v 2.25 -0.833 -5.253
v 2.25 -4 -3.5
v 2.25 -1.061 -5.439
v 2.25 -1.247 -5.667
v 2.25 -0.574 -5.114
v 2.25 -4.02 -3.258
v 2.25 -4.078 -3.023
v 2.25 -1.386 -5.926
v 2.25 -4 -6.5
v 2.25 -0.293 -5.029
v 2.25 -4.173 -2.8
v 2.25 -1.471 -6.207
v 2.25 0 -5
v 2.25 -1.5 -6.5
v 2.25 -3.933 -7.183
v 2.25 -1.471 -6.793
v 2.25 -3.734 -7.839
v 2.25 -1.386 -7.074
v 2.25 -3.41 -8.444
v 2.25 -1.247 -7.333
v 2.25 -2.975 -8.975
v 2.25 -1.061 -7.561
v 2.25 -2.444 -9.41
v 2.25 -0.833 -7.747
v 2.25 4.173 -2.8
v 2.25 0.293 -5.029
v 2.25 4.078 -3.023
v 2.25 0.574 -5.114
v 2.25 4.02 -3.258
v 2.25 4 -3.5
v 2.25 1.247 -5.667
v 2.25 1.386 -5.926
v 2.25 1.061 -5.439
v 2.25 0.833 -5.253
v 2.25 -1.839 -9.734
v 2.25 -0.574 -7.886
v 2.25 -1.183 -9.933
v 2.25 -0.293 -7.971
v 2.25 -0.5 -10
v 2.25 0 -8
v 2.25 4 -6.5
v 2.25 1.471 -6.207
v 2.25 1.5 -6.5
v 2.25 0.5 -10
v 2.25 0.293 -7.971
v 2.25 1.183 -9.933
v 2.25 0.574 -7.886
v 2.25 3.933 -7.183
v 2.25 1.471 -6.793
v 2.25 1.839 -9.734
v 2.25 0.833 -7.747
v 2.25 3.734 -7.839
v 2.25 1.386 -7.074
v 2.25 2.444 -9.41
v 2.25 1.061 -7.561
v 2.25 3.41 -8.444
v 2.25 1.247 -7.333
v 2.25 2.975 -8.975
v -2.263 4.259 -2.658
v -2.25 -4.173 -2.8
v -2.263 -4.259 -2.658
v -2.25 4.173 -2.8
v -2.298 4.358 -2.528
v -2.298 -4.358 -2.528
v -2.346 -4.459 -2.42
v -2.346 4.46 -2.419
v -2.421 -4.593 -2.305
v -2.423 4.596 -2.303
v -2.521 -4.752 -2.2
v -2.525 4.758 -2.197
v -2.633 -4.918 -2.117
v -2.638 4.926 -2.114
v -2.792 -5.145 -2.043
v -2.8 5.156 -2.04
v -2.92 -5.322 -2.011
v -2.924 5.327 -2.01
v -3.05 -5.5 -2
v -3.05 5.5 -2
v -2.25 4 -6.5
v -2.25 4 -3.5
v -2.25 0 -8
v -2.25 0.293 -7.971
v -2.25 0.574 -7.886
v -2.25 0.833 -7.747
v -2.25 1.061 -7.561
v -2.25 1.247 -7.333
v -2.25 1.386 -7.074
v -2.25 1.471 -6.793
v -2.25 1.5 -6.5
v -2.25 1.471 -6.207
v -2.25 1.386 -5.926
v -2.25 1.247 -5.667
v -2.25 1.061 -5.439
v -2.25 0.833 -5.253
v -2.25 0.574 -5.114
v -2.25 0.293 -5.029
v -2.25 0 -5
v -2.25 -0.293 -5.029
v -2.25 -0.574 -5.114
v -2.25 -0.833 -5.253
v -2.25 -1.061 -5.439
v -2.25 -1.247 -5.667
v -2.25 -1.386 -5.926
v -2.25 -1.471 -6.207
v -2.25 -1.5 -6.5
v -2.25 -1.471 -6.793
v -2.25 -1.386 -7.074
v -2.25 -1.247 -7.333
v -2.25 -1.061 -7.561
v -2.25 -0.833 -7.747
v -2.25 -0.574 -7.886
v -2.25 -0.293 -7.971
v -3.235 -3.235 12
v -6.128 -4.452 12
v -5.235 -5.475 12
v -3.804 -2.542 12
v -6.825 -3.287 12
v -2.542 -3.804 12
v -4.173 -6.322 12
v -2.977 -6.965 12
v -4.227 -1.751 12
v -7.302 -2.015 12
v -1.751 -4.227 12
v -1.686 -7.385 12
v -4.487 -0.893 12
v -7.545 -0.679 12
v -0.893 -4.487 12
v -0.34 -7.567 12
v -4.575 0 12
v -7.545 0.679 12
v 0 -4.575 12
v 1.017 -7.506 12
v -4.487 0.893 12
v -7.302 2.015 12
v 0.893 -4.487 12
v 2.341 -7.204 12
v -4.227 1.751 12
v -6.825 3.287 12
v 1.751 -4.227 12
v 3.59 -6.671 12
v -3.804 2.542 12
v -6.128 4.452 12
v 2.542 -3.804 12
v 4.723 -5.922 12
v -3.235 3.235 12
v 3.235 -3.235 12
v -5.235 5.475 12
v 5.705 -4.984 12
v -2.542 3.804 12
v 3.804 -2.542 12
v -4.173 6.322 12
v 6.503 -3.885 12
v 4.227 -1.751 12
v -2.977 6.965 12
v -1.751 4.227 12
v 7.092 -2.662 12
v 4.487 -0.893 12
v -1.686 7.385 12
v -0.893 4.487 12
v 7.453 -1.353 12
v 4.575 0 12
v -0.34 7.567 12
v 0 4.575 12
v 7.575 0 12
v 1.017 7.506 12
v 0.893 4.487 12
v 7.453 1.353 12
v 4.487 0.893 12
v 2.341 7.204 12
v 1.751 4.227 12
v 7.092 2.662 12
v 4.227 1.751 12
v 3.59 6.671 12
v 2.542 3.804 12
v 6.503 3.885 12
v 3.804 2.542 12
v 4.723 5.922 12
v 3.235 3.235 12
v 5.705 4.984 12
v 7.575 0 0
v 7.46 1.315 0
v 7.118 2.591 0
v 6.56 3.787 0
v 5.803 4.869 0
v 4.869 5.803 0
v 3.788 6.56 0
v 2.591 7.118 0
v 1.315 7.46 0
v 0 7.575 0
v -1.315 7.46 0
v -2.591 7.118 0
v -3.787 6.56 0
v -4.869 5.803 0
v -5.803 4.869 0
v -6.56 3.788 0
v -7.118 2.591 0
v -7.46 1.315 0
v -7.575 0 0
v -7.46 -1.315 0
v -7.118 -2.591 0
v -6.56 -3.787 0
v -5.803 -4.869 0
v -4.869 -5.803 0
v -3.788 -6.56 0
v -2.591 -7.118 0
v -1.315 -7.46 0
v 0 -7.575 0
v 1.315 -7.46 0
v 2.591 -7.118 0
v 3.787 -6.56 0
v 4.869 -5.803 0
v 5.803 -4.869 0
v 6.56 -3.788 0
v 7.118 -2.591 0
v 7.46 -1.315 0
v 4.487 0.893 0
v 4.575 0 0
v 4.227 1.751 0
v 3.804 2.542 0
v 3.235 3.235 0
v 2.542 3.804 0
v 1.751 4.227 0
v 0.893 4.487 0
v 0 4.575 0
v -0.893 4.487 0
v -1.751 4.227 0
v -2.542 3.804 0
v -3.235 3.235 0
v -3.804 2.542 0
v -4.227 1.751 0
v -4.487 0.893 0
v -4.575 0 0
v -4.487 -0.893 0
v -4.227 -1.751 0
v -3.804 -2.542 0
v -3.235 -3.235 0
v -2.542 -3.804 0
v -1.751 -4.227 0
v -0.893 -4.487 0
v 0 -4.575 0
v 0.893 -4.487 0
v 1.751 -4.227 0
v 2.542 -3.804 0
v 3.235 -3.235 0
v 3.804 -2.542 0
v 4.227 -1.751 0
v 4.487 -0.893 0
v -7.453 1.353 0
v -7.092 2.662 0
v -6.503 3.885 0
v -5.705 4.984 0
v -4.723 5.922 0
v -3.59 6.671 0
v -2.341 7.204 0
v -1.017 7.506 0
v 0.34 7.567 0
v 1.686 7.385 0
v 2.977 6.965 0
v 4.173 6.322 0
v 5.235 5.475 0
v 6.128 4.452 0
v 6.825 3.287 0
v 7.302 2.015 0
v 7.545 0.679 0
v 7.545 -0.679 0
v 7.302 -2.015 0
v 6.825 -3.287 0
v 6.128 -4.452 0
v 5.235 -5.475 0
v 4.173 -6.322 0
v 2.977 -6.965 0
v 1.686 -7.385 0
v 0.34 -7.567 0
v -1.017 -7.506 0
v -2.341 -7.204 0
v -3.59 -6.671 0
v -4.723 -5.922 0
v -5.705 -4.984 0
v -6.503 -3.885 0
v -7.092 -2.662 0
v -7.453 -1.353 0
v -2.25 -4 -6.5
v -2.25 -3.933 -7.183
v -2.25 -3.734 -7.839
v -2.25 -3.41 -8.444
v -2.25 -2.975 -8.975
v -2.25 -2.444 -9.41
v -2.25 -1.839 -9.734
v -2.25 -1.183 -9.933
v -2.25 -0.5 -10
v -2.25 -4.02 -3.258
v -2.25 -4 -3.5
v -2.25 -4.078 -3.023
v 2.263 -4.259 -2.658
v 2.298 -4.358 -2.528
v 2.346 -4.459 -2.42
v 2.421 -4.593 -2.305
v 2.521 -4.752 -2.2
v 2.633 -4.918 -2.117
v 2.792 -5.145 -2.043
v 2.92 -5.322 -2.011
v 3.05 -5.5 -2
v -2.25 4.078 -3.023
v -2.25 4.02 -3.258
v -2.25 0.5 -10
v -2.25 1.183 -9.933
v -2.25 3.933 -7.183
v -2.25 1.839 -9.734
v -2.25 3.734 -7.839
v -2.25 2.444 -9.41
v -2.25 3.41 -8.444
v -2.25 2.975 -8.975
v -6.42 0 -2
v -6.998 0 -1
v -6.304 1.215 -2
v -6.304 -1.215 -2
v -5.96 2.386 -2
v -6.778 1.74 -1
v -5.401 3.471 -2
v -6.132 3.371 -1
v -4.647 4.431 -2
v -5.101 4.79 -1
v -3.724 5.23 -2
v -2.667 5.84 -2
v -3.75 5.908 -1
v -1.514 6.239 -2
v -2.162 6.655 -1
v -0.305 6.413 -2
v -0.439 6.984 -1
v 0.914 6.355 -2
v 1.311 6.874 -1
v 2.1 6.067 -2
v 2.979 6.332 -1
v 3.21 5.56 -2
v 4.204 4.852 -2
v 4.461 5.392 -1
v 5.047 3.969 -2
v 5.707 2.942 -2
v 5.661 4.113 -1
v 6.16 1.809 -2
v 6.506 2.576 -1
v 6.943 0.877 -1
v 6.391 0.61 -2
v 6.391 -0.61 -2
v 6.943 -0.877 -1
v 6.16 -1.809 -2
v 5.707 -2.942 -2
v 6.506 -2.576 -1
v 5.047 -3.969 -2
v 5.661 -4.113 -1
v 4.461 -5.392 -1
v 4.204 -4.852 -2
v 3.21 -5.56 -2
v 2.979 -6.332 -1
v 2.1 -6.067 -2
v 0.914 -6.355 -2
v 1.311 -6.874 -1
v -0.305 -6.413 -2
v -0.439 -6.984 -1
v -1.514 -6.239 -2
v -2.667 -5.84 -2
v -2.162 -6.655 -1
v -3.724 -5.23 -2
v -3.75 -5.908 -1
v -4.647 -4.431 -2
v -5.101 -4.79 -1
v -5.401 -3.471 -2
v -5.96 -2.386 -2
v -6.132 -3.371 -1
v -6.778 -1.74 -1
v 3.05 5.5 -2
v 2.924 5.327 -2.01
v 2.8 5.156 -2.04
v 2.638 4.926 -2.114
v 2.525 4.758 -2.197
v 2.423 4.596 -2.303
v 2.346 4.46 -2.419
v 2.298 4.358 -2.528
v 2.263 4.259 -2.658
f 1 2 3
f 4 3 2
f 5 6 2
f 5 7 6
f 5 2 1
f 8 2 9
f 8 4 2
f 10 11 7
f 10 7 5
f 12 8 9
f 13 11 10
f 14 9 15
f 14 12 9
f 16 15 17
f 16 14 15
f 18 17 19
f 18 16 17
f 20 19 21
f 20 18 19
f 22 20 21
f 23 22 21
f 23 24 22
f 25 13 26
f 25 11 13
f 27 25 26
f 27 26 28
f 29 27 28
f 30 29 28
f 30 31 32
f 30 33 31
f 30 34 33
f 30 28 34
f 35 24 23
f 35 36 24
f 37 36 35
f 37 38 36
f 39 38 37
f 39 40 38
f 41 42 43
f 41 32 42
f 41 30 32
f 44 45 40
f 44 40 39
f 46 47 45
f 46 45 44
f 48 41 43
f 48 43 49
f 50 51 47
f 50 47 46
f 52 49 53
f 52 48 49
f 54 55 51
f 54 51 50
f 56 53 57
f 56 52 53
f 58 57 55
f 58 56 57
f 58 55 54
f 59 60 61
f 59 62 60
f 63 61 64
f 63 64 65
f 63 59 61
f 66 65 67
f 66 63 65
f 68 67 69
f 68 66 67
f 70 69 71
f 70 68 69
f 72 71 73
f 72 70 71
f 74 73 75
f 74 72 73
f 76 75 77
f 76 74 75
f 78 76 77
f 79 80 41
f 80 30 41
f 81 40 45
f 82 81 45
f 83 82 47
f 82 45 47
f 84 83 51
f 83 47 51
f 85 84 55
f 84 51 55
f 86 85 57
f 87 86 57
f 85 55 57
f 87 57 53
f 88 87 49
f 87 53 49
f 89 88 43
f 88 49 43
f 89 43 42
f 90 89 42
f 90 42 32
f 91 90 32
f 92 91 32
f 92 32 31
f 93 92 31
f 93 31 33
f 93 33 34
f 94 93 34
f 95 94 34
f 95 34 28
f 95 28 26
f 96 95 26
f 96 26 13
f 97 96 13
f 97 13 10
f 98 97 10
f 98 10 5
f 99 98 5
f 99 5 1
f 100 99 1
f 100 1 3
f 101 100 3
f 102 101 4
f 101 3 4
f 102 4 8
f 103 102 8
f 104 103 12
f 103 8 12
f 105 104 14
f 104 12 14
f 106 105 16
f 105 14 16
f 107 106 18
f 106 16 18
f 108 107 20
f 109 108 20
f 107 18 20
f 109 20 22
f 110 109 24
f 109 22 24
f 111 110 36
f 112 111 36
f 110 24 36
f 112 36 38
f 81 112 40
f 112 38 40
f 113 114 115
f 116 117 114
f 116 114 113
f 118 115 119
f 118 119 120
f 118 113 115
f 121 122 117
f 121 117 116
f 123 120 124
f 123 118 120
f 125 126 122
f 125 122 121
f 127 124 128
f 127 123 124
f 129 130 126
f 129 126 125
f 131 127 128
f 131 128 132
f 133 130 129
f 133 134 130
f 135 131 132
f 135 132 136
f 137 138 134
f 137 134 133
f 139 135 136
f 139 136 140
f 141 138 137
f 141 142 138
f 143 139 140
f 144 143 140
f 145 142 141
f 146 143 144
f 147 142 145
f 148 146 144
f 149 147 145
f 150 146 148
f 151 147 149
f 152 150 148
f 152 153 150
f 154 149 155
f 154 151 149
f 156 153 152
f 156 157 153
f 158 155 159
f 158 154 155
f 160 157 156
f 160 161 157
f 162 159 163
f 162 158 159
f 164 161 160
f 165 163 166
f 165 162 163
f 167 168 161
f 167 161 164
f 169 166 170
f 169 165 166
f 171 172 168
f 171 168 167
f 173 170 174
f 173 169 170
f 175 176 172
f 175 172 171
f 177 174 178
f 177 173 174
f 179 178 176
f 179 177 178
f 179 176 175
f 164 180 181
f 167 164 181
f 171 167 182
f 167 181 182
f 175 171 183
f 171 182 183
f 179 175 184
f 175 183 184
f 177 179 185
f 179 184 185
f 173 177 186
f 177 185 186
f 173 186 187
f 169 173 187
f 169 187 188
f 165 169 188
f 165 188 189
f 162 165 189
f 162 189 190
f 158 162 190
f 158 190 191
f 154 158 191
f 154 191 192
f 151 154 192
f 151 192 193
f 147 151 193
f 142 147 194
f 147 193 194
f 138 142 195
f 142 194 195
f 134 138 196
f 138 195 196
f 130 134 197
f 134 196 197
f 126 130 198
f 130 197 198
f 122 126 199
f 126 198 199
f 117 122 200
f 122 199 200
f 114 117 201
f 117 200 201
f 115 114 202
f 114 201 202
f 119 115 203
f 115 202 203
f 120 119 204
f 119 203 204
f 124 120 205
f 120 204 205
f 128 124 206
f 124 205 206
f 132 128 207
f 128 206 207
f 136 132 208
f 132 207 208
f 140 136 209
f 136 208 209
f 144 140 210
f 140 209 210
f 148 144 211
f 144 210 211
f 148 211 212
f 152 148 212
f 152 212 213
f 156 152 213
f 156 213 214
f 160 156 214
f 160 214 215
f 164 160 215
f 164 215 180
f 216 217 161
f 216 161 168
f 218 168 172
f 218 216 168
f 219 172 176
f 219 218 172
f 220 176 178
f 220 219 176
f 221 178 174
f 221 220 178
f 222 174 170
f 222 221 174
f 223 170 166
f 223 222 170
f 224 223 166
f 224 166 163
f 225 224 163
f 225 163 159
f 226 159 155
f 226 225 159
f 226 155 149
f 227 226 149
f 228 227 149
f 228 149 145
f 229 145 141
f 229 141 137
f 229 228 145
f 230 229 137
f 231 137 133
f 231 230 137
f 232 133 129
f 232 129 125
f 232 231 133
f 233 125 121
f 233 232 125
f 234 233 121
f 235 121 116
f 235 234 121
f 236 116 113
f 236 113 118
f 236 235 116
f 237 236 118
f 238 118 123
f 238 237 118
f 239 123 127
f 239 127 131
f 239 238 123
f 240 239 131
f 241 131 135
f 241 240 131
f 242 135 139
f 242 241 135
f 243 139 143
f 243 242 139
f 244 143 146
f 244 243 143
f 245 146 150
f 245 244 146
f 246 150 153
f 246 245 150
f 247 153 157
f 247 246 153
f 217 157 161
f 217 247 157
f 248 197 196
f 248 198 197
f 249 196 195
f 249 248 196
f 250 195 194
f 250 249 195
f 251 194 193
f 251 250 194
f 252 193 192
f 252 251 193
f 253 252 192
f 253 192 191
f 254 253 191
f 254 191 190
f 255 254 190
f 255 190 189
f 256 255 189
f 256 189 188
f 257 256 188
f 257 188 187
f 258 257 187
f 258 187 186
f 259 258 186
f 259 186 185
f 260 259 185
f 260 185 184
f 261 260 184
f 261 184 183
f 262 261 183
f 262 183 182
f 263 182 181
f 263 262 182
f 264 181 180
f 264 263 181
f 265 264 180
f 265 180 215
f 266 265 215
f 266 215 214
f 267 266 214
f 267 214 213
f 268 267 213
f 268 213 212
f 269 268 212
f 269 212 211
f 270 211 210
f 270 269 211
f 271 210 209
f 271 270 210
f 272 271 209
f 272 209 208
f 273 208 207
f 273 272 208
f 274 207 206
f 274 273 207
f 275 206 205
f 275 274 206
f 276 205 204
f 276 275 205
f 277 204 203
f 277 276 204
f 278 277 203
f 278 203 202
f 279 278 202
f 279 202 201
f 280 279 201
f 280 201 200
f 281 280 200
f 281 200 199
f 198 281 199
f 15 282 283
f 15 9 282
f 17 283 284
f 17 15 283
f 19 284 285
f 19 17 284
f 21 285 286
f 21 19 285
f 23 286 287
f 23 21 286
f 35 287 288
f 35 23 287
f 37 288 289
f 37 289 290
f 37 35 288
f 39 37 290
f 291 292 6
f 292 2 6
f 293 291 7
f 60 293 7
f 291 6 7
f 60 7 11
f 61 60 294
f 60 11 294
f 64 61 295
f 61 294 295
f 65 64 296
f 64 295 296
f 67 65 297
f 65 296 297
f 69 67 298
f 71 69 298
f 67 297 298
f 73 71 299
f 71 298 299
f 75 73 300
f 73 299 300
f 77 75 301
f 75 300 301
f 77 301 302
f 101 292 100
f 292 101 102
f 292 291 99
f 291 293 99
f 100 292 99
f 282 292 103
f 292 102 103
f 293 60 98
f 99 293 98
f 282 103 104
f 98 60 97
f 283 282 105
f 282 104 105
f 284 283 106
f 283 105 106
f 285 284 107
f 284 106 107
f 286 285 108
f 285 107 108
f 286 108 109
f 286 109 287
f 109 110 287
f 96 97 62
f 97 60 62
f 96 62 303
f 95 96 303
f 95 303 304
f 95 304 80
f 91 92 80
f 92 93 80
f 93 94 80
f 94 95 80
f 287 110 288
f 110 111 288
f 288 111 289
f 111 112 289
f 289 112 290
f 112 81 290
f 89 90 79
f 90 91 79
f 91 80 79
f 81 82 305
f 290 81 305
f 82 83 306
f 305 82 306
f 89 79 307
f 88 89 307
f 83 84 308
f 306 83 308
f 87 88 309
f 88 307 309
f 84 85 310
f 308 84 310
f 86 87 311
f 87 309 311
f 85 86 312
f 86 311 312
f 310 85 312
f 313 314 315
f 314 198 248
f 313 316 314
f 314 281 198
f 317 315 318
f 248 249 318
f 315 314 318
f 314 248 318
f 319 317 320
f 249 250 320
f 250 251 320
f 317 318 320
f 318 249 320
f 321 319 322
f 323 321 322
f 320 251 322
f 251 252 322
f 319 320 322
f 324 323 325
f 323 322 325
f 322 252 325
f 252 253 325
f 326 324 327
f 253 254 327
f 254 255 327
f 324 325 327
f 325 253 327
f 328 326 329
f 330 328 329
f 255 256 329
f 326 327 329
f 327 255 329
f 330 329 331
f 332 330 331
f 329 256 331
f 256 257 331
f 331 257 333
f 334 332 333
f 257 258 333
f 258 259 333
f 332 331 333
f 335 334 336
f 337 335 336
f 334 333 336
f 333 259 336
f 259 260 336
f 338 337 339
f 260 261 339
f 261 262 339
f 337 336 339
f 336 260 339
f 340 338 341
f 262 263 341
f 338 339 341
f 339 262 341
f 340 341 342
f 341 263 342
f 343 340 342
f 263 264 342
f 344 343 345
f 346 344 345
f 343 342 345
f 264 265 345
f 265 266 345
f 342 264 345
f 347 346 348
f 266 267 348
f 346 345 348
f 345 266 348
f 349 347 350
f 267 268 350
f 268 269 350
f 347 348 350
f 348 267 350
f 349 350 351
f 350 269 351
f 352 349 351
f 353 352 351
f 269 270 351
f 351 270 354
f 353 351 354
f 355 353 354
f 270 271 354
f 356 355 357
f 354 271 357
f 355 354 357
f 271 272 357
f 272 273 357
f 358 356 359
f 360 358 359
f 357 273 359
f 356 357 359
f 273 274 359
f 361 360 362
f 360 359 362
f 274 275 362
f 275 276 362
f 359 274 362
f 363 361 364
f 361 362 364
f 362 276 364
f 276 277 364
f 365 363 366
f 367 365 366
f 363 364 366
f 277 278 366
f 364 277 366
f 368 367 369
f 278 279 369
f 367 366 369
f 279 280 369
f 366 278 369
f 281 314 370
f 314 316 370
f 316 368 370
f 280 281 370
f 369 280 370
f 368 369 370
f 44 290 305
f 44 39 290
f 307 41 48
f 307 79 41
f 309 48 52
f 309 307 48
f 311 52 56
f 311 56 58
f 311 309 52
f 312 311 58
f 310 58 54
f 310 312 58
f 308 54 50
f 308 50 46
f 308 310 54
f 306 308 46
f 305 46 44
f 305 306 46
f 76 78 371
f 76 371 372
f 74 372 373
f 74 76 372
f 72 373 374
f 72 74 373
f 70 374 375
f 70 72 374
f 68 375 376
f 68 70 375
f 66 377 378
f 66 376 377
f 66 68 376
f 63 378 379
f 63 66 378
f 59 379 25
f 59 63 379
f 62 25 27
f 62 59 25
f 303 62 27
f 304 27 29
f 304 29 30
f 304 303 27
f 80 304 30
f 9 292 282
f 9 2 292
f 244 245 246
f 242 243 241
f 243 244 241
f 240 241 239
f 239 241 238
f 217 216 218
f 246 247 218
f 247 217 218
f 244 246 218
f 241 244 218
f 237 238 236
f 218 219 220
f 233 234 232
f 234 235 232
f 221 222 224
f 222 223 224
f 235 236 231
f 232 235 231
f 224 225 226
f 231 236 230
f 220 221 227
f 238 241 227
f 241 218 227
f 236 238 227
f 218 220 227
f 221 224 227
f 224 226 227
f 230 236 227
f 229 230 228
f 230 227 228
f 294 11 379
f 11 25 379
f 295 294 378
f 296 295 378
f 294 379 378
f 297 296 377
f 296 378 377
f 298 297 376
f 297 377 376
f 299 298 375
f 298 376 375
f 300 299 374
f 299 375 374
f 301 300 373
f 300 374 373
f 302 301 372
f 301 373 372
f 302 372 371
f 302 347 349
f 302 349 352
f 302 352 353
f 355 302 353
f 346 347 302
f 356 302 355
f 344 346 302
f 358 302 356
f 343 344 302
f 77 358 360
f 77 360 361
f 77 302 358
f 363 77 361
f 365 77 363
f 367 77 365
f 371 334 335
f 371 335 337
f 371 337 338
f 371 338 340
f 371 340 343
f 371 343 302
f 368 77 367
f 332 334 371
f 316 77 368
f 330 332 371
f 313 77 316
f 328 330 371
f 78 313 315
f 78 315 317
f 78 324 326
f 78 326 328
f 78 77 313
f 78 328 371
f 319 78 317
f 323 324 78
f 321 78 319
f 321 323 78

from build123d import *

# Parameters (mm, degrees)
SKETCH1_R           = 7.575
SKETCH1_R_2         = 4.575
BOSS_EXTRUDE1_DEPTH = 12
BOSS_EXTRUDE2_START = 2
SKETCH2_R           = 7.575
BOSS_EXTRUDE2_DEPTH = 2
SKETCH4_W           = 8
SKETCH4_H           = 8
BOSS_EXTRUDE3_DEPTH = 2.25
SKETCH5_R           = 1.5
CUT_EXTRUDE1_DEPTH  = 18.260105735
FILLET1_R           = 3.5
FILLET2_R           = 1.5
FILLET3_R           = 0.8
CHAMFER1_SIZE2      = 2
CHAMFER1_SIZE       = 1.154700538


with BuildPart() as part:
    # Sketch1 → Boss-Extrude1 (new body)
    with BuildSketch(Plane.XY):
        Circle(SKETCH1_R)
        Circle(SKETCH1_R_2, mode=Mode.SUBTRACT)
    extrude(amount=BOSS_EXTRUDE1_DEPTH)

    # Sketch2 → Boss-Extrude2 (add)
    with BuildSketch(Plane(origin=(0, 0, 0), x_dir=(-1, 0, 0), z_dir=(0, 0, -1)).offset(BOSS_EXTRUDE2_START)):
        Circle(SKETCH2_R)
    extrude(amount=-BOSS_EXTRUDE2_DEPTH)

    # Sketch4 → Boss-Extrude3 (add, symmetric)
    with BuildSketch(Plane(origin=(0, 0, 0), x_dir=(0, 0, -1), z_dir=(1, 0, 0))):
        with Locations((6, 0)):
            Rectangle(SKETCH4_W, SKETCH4_H)
    extrude(amount=BOSS_EXTRUDE3_DEPTH, both=True)

    # Sketch5 → Cut-Extrude1 (cut, through all)
    with BuildSketch(Plane(origin=(2.25, 0, 0), x_dir=(0, 0, -1), z_dir=(1, 0, 0))):
        with Locations((6.5, 0)):
            Circle(SKETCH5_R)
    extrude(amount=-CUT_EXTRUDE1_DEPTH, mode=Mode.SUBTRACT)

    # Fillet1
    fillet1_edges = [part.edges().sort_by_distance(p)[0] for p in [
        (0, -4, -10),
        (0, 4, -10),
    ]]
    fillet(fillet1_edges, radius=FILLET1_R)

    # Fillet2
    fillet2_edges = [part.edges().sort_by_distance(p)[0] for p in [
        (0, 4, -2),
        (0, -4, -2),
    ]]
    fillet(fillet2_edges, radius=FILLET2_R)

    # Fillet3
    fillet3_edges = [part.edges().sort_by_distance(p)[0] for p in [
        (-2.25, 0, -2),
        (2.25, 0, -2),
    ]]
    fillet(fillet3_edges, radius=FILLET3_R)

    # Chamfer1
    chamfer1_edges = [part.edges().sort_by_distance(p)[0] for p in [
        (7.575, 0, -2),
    ]]
    chamfer1_side = [part.faces().sort_by_distance(p)[0] for p in [
        (7.551905989, 0, -2),
    ]]
    chamfer(chamfer1_edges, length=CHAMFER1_SIZE - 0.0001, length2=CHAMFER1_SIZE2 - 0.0001, reference=chamfer1_side[0])  # a hair under: the kernel refuses the full size


solid = part.part
